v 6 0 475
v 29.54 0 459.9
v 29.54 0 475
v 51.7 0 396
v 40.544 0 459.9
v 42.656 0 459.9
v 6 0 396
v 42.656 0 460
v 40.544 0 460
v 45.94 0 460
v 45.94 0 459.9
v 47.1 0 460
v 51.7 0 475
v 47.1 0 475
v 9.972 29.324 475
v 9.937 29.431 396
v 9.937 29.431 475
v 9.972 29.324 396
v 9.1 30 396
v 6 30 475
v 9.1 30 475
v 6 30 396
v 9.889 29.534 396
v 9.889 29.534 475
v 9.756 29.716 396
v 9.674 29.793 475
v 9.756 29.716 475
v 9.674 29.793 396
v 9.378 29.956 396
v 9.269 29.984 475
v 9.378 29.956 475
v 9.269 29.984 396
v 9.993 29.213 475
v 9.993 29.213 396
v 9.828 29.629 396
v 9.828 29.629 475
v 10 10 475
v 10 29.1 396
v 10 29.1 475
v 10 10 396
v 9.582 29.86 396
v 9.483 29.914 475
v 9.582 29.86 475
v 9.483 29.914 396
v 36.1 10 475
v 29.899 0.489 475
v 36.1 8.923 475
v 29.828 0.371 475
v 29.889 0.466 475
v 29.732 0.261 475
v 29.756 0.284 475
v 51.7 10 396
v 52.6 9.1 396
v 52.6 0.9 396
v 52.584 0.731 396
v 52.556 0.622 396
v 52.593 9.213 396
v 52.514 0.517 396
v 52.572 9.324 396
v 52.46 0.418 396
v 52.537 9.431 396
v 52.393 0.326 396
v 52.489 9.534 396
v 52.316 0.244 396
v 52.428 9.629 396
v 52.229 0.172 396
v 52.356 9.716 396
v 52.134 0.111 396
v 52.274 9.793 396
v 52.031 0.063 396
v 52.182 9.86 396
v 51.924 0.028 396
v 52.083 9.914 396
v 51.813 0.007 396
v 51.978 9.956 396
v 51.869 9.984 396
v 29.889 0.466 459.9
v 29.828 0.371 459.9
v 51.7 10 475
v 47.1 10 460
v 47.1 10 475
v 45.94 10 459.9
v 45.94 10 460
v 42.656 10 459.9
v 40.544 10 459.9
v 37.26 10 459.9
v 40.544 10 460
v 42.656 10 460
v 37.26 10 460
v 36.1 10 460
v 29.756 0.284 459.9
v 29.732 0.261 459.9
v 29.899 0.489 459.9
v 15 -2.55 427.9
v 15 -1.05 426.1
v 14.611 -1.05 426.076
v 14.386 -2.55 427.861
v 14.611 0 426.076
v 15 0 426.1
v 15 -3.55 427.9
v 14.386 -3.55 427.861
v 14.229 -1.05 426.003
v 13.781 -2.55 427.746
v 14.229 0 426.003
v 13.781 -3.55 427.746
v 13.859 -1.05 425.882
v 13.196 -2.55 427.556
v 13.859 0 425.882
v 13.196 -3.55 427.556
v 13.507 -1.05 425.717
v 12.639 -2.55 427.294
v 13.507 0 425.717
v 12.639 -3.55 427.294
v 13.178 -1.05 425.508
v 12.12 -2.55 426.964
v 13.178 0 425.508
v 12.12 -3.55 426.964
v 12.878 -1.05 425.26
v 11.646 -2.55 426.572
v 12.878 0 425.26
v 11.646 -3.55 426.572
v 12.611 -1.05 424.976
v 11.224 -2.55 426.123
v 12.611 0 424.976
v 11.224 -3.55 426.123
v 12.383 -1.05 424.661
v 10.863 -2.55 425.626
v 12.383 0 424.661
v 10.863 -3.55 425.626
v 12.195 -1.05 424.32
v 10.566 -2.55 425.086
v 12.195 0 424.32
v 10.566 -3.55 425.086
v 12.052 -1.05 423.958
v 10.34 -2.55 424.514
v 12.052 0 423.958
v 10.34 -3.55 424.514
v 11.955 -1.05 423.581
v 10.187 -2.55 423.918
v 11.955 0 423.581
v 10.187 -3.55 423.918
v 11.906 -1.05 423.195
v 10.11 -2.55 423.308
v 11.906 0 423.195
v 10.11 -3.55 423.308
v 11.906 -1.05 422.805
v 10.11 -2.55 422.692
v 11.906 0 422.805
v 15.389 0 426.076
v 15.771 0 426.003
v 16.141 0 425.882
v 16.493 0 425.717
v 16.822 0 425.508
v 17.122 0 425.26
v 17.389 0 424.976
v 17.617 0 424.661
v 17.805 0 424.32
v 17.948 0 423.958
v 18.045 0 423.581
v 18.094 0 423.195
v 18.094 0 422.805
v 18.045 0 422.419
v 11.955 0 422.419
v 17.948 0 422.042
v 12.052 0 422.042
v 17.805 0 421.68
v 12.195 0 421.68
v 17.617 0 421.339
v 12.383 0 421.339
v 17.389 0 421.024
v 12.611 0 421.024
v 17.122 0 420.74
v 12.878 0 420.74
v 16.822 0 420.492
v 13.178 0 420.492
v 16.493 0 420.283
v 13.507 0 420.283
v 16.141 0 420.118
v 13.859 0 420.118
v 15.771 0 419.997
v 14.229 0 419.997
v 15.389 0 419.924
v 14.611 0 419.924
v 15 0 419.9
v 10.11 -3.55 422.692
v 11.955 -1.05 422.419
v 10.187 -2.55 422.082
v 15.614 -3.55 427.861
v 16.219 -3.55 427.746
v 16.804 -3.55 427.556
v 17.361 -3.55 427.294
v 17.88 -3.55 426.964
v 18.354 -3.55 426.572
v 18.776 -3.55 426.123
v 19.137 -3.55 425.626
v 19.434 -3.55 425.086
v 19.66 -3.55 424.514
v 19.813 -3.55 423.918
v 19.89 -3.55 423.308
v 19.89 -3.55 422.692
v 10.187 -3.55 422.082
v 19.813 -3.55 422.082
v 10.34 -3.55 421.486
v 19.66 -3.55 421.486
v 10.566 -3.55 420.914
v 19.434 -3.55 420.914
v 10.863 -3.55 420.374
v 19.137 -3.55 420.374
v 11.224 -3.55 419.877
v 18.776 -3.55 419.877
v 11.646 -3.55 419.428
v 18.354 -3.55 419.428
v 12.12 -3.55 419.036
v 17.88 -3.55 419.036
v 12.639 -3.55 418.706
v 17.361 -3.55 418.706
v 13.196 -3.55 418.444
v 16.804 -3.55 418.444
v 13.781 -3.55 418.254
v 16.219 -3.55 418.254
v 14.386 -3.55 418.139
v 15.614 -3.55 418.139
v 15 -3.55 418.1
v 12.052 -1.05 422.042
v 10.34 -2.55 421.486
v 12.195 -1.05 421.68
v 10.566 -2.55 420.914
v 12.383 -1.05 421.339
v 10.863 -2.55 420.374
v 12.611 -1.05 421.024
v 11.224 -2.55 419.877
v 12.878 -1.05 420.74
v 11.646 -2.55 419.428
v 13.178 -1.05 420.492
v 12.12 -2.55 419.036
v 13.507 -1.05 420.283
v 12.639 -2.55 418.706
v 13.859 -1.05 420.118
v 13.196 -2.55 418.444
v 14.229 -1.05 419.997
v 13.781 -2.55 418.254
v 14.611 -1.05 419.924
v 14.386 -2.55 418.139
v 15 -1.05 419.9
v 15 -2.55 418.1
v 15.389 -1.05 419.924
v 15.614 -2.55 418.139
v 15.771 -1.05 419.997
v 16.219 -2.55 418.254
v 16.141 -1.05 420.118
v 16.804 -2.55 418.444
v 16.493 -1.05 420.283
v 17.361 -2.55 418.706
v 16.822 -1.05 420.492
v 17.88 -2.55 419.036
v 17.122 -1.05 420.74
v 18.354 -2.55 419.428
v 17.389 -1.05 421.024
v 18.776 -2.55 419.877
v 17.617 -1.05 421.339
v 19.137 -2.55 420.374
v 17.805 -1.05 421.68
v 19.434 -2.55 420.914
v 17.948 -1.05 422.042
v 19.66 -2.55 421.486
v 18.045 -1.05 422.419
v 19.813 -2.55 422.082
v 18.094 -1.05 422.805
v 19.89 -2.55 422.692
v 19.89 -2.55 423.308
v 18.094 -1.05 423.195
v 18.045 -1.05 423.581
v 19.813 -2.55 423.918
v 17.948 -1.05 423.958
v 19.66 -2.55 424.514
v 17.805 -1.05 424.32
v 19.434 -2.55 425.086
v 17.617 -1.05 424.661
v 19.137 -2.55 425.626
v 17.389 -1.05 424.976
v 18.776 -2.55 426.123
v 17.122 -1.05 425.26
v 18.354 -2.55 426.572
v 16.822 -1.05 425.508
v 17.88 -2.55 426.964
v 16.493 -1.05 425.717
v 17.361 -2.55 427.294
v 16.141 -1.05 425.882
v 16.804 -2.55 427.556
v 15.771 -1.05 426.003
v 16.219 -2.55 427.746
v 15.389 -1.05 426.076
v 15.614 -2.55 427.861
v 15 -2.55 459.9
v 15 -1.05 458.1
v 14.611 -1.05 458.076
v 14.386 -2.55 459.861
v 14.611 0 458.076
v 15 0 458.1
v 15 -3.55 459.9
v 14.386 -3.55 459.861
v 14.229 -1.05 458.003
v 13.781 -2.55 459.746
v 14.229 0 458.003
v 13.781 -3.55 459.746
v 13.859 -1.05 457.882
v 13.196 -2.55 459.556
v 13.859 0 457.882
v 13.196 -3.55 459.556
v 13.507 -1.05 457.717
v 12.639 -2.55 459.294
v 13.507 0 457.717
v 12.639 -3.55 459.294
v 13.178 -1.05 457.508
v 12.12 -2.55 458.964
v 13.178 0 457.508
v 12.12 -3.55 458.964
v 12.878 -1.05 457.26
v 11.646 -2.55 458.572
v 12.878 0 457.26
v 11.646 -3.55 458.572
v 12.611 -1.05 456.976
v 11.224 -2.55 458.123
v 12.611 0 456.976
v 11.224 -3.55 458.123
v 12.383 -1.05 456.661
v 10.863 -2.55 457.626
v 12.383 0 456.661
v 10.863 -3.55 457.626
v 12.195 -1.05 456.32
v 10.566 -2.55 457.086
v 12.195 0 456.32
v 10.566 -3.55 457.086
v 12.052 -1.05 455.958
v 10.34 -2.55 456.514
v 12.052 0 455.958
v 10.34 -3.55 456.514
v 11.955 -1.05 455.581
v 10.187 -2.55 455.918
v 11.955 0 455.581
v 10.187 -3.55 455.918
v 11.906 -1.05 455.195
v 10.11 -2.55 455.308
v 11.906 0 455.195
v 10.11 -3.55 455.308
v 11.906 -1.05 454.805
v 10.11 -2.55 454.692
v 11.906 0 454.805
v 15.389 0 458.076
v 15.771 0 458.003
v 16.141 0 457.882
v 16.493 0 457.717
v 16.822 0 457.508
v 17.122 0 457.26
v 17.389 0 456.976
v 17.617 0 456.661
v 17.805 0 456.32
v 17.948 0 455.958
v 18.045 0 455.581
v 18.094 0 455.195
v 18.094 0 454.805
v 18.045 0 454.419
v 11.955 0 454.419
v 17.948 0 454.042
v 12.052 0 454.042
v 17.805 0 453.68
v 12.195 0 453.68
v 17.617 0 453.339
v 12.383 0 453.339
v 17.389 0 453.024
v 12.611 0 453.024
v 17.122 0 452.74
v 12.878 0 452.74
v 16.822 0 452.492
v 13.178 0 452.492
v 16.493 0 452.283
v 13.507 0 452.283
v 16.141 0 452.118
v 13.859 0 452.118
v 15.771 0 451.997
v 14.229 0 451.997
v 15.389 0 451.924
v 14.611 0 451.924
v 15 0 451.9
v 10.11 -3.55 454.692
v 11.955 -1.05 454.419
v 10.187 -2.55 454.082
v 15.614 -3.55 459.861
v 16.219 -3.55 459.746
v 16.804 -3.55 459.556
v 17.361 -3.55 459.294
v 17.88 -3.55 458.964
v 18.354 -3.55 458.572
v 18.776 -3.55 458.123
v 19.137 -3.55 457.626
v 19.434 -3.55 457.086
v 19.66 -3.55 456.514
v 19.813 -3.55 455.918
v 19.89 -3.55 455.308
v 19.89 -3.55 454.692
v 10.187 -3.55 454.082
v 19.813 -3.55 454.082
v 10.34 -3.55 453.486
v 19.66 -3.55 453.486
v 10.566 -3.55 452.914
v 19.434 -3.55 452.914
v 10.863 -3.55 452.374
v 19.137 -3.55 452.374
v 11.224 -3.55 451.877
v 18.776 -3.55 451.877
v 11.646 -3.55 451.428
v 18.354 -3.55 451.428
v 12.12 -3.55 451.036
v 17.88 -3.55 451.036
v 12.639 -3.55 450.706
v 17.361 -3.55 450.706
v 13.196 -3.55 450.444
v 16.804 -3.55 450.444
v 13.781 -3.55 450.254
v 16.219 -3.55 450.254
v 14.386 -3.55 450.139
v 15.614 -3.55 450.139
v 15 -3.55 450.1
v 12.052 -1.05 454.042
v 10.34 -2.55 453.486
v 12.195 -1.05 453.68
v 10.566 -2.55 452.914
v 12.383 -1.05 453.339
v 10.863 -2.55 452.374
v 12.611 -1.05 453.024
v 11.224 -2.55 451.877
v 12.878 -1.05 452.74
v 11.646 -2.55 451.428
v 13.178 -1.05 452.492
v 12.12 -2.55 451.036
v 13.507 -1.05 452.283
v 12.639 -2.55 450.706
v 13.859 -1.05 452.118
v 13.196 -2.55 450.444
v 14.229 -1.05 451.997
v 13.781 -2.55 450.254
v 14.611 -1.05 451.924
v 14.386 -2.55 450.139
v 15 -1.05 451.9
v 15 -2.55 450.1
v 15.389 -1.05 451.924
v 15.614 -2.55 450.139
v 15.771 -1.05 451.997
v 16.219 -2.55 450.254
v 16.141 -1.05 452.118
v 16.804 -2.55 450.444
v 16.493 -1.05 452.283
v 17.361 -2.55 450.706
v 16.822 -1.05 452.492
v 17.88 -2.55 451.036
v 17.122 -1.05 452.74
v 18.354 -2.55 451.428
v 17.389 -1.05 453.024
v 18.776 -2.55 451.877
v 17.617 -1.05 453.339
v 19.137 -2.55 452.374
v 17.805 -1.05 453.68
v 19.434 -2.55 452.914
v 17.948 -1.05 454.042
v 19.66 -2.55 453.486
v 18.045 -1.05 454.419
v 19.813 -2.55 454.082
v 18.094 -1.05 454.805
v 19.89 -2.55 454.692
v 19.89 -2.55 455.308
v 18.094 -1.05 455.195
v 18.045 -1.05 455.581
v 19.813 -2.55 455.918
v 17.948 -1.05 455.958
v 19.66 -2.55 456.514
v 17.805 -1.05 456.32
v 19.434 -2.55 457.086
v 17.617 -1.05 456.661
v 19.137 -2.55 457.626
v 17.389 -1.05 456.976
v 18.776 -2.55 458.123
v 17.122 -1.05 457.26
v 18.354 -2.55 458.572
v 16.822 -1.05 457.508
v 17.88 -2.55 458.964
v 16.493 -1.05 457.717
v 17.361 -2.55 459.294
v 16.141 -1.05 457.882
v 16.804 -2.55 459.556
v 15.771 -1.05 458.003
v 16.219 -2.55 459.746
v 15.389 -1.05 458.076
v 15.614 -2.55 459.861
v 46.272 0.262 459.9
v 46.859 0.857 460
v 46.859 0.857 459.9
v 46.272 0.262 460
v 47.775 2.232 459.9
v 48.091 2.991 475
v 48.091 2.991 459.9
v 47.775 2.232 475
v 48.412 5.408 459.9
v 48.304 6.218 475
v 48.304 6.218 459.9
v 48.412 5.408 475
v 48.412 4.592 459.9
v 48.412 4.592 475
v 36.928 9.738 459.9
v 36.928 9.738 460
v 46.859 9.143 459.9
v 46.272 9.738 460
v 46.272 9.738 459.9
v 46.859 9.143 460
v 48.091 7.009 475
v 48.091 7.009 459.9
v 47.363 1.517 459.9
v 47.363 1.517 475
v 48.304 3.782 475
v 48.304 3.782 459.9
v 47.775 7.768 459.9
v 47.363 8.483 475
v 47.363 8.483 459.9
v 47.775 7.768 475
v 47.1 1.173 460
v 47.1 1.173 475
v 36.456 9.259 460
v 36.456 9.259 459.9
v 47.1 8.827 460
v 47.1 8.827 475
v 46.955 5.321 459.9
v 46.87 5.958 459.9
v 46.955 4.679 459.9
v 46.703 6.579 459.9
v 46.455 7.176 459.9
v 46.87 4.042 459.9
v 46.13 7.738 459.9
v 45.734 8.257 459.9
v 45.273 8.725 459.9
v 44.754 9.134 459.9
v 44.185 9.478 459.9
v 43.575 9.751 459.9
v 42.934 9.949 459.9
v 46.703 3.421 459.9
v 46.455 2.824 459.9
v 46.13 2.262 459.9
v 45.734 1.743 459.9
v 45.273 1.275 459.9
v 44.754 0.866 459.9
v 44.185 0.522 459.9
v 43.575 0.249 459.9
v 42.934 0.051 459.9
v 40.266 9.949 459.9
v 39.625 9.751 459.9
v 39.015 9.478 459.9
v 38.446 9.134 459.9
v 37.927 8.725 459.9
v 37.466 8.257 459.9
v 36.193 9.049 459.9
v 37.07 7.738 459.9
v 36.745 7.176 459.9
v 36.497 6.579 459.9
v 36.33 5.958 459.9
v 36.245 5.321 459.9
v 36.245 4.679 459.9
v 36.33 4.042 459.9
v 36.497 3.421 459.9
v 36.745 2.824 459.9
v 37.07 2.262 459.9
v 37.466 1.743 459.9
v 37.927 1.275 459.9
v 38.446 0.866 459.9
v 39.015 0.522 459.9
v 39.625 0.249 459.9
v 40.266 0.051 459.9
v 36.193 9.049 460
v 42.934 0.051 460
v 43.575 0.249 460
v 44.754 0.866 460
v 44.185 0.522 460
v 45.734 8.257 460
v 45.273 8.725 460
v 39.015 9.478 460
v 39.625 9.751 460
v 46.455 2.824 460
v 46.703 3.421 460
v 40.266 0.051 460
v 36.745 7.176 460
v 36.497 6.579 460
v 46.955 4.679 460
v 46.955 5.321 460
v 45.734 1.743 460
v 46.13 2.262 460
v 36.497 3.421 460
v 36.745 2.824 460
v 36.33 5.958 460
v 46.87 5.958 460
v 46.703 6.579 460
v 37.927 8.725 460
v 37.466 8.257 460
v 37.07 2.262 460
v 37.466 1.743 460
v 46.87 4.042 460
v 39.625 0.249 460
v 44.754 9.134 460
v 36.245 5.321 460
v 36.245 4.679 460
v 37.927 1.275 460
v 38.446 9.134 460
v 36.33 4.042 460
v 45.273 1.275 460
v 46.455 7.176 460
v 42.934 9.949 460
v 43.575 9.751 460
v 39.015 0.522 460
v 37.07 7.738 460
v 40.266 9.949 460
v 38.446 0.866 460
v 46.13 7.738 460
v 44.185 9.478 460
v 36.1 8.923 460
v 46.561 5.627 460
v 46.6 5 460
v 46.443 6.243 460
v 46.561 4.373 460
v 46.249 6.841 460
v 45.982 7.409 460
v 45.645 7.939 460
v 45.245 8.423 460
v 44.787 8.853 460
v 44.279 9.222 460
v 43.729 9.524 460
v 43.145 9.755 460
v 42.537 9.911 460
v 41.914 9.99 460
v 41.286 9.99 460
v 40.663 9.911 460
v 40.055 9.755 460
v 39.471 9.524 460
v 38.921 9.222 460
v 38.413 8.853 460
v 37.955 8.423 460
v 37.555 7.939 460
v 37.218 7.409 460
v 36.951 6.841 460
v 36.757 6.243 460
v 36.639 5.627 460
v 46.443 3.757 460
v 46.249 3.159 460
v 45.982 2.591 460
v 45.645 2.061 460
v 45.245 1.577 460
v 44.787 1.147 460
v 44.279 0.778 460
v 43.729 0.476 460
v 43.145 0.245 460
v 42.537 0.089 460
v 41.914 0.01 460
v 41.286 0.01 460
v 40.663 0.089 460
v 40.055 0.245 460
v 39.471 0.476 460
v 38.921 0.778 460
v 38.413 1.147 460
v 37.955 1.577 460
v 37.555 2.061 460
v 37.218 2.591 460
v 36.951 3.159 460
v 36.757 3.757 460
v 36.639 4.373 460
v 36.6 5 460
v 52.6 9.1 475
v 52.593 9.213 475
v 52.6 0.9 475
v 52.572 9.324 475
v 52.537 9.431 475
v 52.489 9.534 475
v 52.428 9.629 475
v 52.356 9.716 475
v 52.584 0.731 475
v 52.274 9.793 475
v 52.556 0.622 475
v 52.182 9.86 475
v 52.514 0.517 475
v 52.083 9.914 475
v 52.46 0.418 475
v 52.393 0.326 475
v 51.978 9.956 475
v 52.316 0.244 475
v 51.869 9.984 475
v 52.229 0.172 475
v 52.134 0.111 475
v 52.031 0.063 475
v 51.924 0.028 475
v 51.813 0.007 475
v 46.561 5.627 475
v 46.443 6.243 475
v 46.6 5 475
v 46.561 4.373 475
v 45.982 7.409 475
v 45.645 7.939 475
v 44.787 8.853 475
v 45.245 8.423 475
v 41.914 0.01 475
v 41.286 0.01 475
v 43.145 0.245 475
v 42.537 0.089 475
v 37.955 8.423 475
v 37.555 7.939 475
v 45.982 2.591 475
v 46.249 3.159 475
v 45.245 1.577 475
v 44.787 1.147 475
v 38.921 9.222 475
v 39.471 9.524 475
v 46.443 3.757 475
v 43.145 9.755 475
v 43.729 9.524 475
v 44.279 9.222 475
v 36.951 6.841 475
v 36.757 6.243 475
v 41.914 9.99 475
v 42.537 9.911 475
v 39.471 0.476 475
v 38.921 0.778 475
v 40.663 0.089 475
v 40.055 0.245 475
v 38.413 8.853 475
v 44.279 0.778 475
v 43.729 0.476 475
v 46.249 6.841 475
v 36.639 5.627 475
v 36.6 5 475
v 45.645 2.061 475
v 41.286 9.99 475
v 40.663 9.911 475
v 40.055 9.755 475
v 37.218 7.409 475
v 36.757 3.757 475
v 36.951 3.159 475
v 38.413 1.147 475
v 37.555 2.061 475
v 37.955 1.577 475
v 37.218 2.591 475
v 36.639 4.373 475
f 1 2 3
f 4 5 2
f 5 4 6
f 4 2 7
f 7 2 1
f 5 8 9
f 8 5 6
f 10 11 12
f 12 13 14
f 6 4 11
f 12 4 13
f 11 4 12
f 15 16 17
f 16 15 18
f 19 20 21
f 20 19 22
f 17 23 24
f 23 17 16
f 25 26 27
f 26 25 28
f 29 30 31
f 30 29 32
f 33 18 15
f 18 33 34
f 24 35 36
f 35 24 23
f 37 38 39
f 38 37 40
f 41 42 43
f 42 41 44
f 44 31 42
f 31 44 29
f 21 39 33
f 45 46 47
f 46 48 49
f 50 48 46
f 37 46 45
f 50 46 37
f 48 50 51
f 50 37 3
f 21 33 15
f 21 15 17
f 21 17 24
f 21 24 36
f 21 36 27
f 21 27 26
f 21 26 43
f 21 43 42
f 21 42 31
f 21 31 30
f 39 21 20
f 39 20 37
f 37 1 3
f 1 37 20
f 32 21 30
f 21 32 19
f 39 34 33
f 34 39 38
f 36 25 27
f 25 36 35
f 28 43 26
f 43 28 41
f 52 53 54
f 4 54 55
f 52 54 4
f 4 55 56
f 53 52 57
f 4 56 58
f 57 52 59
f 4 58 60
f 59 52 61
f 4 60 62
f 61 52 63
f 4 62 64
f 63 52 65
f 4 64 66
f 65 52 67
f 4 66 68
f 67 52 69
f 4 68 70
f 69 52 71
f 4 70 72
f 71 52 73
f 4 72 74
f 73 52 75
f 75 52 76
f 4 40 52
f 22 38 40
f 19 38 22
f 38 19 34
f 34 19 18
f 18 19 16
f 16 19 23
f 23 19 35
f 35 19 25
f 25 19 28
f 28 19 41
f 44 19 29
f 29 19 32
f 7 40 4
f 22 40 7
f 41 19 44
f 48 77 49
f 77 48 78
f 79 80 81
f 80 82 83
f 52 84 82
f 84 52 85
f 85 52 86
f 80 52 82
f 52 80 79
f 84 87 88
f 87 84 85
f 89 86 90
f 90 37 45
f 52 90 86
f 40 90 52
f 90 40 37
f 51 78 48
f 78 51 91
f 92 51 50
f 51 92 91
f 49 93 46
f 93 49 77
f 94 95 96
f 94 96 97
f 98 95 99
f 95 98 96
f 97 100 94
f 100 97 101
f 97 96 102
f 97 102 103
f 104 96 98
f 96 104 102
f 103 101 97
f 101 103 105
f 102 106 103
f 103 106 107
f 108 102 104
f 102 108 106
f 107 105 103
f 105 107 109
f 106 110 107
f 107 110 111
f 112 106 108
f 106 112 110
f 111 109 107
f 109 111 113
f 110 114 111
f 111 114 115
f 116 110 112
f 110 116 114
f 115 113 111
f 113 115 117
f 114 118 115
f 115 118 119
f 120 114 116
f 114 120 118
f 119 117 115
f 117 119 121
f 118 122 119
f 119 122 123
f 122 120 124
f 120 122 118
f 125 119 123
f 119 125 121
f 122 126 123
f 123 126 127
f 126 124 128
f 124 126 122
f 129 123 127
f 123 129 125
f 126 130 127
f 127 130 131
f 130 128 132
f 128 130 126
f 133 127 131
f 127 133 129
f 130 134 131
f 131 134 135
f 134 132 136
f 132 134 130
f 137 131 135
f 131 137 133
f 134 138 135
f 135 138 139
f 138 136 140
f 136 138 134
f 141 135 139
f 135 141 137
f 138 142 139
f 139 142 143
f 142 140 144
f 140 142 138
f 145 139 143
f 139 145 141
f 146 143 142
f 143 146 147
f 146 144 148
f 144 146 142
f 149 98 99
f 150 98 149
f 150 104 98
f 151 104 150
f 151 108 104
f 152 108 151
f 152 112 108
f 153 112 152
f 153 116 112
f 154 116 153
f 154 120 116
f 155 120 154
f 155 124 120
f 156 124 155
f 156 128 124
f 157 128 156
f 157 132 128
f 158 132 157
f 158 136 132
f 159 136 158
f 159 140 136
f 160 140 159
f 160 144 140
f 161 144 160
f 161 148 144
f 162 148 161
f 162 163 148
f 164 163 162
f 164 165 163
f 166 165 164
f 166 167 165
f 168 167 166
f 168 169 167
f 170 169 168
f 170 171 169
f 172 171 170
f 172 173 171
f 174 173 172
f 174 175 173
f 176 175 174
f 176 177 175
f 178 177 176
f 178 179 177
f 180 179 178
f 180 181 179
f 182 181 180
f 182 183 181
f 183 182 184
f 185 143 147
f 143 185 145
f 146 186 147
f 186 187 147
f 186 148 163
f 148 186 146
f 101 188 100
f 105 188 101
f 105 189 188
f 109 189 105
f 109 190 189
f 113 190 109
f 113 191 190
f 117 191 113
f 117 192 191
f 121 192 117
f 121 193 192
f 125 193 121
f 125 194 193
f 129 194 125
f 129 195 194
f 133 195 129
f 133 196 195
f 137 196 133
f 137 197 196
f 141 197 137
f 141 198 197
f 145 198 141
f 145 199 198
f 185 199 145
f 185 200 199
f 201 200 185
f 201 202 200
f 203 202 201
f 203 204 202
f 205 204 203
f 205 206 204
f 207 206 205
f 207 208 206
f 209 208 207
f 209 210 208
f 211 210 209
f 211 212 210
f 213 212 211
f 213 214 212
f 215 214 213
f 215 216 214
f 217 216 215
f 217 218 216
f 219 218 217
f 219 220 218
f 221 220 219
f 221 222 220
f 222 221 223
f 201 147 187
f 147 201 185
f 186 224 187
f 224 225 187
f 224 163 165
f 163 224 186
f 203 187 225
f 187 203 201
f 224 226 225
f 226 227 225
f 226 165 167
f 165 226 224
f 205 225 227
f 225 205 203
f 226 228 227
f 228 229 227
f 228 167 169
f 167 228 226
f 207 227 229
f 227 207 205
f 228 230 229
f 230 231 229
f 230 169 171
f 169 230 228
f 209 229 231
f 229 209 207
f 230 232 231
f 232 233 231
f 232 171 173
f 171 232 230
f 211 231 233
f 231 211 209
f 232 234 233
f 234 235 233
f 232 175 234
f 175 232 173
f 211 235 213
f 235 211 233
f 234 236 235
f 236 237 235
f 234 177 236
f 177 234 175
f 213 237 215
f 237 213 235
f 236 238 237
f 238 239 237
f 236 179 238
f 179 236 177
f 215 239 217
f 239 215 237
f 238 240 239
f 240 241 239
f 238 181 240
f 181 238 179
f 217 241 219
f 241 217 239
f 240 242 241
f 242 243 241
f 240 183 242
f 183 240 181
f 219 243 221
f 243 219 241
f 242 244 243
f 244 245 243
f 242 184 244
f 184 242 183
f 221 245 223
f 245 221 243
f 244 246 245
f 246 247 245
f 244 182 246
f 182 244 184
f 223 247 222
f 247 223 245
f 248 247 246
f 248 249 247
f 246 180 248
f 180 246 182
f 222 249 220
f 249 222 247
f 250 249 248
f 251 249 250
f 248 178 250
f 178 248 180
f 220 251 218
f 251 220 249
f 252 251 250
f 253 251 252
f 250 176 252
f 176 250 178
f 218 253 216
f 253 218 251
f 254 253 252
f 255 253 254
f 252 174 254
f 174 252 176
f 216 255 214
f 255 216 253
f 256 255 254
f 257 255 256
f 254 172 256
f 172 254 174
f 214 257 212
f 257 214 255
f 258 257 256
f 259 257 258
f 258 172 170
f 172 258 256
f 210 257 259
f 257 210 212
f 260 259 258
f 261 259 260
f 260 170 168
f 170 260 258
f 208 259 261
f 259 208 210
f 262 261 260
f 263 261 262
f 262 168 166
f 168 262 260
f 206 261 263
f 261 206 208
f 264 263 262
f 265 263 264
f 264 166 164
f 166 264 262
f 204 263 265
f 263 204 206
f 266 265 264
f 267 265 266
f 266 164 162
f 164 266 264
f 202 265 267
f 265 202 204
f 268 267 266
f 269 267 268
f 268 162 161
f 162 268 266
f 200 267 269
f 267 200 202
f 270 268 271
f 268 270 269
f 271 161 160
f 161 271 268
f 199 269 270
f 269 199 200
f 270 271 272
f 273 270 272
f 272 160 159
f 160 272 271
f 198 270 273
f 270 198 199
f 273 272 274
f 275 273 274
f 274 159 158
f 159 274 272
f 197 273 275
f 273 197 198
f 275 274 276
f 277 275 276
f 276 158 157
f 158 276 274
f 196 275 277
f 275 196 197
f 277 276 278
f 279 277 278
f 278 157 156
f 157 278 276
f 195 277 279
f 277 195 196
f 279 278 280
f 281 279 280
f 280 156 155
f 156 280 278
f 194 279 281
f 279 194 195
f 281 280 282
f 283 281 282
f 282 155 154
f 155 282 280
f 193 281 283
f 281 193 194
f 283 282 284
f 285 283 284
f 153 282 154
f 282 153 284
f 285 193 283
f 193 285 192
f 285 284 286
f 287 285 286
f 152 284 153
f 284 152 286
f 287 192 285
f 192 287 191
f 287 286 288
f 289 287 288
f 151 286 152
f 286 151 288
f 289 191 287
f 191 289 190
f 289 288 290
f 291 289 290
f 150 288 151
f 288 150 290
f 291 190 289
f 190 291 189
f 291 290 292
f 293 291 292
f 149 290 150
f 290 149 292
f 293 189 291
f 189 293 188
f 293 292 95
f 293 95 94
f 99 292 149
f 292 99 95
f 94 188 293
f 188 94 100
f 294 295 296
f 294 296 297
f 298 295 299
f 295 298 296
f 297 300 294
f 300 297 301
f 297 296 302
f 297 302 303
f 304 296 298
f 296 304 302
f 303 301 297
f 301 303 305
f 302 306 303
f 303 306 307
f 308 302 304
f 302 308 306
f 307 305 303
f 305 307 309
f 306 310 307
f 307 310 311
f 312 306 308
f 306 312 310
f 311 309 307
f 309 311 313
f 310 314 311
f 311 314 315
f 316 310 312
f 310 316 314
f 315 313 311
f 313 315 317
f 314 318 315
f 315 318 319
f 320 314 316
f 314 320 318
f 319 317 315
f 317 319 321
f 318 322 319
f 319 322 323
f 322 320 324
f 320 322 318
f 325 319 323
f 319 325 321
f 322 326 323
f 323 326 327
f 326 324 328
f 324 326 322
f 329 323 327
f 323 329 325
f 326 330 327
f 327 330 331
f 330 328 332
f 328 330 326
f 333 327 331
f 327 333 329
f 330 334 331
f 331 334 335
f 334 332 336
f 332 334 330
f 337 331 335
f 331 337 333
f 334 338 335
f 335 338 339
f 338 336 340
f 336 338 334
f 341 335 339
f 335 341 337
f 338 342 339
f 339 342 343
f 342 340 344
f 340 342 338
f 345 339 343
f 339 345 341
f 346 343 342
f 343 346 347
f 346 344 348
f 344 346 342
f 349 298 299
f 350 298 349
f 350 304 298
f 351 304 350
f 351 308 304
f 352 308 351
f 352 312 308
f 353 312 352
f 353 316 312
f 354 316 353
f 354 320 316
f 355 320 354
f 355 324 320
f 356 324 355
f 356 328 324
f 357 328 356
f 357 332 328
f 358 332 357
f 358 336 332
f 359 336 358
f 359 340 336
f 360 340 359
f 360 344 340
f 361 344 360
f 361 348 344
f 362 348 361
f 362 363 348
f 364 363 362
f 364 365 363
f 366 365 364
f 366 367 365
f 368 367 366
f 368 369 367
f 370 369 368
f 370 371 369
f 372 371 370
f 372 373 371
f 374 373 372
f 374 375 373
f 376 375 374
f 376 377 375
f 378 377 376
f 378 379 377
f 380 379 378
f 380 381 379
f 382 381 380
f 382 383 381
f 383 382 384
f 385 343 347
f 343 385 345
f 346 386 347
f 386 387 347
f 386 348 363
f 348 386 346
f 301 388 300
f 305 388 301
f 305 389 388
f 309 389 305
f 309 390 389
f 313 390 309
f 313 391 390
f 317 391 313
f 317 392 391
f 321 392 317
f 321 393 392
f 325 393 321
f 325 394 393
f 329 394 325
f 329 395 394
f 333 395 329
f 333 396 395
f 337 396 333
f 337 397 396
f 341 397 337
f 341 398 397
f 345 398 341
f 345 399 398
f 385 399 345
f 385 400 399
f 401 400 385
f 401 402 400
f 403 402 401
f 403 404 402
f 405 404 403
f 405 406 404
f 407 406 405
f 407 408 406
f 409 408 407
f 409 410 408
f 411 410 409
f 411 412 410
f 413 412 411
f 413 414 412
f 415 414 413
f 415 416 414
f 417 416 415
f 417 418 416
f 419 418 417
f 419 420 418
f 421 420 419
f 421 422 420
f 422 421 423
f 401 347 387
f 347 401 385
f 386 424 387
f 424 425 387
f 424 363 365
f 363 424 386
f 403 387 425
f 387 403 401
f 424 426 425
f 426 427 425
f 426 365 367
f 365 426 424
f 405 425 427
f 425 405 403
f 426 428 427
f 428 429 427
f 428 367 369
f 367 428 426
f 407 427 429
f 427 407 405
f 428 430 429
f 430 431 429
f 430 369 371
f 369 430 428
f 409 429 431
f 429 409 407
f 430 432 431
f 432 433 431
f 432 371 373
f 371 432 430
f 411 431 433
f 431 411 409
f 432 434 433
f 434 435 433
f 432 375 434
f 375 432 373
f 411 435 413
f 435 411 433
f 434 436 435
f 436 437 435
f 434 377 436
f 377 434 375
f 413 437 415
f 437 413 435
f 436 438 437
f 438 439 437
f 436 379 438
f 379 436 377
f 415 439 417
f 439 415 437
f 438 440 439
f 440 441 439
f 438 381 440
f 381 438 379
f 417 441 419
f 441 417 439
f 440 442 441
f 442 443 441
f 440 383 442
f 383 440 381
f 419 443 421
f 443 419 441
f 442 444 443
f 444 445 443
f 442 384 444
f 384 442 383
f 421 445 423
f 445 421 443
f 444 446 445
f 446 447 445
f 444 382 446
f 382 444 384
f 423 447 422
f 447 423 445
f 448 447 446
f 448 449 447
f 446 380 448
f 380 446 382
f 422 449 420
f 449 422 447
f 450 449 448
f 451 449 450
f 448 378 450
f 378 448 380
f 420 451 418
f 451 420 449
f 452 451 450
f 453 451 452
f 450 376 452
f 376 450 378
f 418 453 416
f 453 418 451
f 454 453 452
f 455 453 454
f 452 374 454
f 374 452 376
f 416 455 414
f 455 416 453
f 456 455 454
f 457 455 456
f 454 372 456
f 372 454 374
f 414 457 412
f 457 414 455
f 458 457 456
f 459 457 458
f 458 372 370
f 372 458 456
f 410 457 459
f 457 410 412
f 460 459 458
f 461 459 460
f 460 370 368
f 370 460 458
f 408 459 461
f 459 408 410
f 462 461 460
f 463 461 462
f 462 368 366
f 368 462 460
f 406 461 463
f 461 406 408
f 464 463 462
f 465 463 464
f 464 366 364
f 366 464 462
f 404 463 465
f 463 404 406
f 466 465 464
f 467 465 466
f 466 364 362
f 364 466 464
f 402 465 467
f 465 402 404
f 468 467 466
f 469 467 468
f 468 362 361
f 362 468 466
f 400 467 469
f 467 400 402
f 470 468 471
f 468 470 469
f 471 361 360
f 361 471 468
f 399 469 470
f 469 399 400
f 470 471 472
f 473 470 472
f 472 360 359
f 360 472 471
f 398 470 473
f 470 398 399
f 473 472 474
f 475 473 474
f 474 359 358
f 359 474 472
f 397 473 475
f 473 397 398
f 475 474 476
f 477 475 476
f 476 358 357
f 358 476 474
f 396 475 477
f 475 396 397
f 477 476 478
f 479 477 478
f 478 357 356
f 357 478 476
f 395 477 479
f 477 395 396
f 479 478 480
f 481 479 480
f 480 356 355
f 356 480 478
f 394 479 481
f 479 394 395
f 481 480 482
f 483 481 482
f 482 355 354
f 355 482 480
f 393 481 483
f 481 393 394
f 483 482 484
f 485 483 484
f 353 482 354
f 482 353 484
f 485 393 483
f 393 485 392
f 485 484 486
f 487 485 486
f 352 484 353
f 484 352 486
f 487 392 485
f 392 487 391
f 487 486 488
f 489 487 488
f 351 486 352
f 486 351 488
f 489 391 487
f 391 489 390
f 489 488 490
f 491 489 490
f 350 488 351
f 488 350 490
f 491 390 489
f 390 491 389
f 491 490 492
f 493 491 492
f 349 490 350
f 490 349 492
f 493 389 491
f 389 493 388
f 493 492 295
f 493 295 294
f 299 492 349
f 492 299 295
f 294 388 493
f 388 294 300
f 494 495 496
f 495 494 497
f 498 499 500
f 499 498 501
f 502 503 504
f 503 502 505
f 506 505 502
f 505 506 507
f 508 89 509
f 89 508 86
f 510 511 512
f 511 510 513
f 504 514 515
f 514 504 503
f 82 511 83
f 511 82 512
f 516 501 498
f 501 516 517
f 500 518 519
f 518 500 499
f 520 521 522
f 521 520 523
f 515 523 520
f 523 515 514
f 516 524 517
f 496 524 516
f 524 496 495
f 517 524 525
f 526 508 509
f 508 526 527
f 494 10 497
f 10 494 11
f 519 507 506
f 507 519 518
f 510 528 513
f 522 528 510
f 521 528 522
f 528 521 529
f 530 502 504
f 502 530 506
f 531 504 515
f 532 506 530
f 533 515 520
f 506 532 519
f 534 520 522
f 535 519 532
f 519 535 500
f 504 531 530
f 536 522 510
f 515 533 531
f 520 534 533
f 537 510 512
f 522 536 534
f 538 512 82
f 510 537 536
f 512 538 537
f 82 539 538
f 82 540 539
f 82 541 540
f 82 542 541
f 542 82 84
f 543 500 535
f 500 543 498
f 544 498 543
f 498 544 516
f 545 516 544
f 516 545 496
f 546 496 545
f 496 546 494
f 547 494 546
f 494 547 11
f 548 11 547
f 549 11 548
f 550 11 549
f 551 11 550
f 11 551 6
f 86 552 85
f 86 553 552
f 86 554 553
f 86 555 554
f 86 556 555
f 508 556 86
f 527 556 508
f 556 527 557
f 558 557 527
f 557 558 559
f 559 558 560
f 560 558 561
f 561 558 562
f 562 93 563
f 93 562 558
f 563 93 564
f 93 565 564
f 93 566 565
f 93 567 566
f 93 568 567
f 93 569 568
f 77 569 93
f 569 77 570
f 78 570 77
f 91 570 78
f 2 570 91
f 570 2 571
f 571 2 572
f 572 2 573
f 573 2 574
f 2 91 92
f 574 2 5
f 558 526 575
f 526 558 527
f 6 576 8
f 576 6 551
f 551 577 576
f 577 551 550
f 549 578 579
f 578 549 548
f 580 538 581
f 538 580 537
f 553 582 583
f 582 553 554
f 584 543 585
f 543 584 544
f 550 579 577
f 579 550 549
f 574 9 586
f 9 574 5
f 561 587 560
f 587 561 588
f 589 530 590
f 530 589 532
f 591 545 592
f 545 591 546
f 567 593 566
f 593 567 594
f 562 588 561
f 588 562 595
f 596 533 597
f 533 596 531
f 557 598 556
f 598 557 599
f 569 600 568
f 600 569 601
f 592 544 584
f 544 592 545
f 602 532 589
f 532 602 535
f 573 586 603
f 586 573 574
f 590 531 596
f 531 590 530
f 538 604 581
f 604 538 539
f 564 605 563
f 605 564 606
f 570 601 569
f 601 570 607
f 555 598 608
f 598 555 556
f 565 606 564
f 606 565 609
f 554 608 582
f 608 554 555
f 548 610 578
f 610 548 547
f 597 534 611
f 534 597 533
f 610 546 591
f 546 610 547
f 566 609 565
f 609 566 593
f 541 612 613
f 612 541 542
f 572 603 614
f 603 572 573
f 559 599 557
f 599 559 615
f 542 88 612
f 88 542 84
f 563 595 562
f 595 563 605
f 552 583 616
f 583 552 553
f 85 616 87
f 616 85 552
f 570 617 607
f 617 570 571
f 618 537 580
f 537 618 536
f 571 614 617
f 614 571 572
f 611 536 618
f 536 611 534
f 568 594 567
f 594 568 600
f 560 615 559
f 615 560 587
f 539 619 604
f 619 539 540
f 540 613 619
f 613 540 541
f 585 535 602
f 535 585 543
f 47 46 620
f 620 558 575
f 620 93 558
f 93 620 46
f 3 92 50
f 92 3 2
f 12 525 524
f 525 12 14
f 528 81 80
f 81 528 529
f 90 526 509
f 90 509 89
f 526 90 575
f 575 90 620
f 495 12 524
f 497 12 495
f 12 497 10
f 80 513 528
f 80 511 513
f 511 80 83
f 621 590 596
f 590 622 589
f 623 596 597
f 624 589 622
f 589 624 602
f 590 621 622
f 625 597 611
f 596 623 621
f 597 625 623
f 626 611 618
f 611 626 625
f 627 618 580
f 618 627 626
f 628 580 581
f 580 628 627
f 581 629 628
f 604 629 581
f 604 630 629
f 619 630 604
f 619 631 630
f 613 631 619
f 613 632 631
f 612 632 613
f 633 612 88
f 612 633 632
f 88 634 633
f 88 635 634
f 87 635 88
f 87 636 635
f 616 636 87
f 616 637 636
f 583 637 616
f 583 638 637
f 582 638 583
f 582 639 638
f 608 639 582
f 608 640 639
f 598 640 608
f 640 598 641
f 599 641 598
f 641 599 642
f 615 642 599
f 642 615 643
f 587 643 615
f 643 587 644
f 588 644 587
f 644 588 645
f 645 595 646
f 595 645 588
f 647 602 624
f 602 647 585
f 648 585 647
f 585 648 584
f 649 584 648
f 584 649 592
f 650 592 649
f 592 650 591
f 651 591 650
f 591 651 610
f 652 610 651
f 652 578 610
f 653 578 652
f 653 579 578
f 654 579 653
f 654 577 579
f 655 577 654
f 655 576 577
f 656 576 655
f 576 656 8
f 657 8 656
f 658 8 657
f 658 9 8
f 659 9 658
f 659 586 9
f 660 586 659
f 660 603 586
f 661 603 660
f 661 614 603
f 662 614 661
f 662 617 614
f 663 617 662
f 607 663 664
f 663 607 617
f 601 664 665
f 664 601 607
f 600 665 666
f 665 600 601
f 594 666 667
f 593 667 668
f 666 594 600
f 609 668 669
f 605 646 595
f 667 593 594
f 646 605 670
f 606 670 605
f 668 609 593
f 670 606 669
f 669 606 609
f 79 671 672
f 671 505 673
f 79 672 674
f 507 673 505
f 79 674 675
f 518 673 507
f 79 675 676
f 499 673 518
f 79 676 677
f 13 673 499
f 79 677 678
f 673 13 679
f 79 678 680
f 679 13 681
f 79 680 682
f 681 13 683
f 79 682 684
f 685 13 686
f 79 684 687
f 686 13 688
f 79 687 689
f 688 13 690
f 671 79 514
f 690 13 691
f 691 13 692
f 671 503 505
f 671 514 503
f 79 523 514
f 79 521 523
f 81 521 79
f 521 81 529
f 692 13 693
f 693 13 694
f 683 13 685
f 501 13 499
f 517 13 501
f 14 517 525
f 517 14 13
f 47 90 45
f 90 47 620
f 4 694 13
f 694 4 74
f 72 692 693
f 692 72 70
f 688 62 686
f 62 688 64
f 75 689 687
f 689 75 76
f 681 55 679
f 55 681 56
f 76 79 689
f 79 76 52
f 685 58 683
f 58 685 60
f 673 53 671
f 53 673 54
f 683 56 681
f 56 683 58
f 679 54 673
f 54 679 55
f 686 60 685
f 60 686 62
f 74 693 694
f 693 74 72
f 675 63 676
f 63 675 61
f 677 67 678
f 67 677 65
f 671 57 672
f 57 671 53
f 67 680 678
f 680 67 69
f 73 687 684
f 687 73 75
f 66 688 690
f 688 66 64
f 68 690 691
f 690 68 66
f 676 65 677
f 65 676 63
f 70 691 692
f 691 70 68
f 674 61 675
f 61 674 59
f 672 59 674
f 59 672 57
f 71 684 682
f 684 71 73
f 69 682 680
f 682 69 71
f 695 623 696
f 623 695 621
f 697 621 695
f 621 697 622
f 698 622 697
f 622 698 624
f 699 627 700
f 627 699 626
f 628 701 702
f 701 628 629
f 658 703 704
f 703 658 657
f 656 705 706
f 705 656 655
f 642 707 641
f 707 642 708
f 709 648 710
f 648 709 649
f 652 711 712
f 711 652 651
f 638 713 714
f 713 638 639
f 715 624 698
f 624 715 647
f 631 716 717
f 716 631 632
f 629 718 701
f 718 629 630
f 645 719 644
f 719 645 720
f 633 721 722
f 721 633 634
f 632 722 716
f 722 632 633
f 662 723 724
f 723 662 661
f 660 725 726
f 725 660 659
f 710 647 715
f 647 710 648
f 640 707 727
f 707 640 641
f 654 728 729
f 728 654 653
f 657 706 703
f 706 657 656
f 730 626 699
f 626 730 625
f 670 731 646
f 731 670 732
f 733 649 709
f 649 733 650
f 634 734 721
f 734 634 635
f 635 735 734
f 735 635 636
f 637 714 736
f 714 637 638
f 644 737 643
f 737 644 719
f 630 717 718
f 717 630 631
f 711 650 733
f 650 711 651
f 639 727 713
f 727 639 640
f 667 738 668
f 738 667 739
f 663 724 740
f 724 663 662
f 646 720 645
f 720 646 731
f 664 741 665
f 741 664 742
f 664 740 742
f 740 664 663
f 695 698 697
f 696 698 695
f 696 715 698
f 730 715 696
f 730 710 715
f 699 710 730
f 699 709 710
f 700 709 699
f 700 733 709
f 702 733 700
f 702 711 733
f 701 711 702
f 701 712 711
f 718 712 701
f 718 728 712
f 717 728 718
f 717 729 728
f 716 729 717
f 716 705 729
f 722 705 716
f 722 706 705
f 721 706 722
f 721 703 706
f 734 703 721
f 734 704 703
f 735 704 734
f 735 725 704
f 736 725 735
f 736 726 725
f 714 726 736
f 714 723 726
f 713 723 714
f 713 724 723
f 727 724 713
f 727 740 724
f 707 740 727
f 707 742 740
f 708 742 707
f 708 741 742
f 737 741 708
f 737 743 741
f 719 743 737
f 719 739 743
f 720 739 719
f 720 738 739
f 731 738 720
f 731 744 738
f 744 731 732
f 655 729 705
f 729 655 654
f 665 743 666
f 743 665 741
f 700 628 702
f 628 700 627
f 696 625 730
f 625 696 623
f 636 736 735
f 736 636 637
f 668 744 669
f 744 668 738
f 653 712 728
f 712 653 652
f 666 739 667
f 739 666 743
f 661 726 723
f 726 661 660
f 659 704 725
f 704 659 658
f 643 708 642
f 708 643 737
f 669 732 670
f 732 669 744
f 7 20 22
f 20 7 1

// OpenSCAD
$fn=50;

plastic_thickness=2.0;
tolerance=0.22;

// Specify enclosure dimensions
enclosure_height=475.0;

enclosure_depth=535.0;

// Wall panel dimensions
panel_thickness=6.0;
panel_height=450.0;
panel_width=535.0;
panel_offset_z = enclosure_height - panel_height;

// Door panel dimensions
door_panel_thickness=3.0;
door_panel_width=250.0;
door_panel_height=475.0;
door_hinge_offset=6.5;

// Frame
frame_corner_width=30.0;
frame_corner_height=79.0;
frame_thickness = plastic_thickness*2 + panel_thickness;
frame_side = (enclosure_height - frame_corner_height*2)/2;
frame_clip_height=50.5;
corner_roundness=0.9;

// Interlock
knob_diameter=9.8;
lug_diameter=6.2;
lug_gap=1.4;
lug_height = lug_gap+2.15;
interlock_offset_x=15.0;
interlock_offset_z=27.0;
interlock_gap=32;

// Door hinge
hinge_inner_diameter=10;
hinge_height=25;
hinge_length=53;
hinge_gap = 9.6;
hinge_clearance = 1.5;
hinge_ring_thickness=3.0;
hinge_thickness=plastic_thickness*2 + door_panel_thickness;
hinge_offset=6.5+plastic_thickness;


enclosure_width=2*(frame_corner_width+plastic_thickness+hinge_gap+door_hinge_offset) + door_panel_width*2 +tolerance;

// applies roundness without altering dimensions of object
module apply_roundness(r)
    offset(r) offset(delta=-r) children(0);

// makes a corner piece by mirroring and rotating one side
module cornerize() {
    union() {
        children(0);
        mirror([0,1,0]) 
            rotate([0,0,-90])
                children(0);
    }
} 

// translates an imperceptible difference to avoid coincident faces
// in CSG operations. this is used to remove glitches in preview
module fix_preview() {
    translate($preview?[-0.001,-0.001,-0.001]:[0,0,0])
        children(0);
}

module fix_preview2() {
    translate($preview?[-0.001,0.001,-0.001]:[0,0,0])
        children(0);
}

module fix_preview3() {
    translate($preview?[-0.001,0.001,0.001]:[0,0,0])
        children(0);
}


module wall_panel() {
    cube([panel_height,panel_width,panel_thickness]);
}

module door_panel() {
     cube([door_panel_width,door_panel_height,door_panel_thickness]);
}

module left_wall_panel() {
    translate([panel_thickness,0,panel_offset_z]) 
        rotate([0,-90,0]) 
            wall_panel();
}

module back_wall_panel() {
    translate([(enclosure_width-panel_width)/2,enclosure_depth-panel_thickness-plastic_thickness,panel_offset_z]) 
        rotate([-90,-90,0]) 
            wall_panel();
}

module right_wall_panel() {
    translate([enclosure_width,0,panel_offset_z]) 
        rotate([0,-90,0]) 
            wall_panel();
}

module left_door(open=false) {
    translate([frame_corner_width+plastic_thickness+hinge_gap,hinge_inner_diameter/2,0]) 
        rotate([90,0,open?-90:0]) 
            translate([door_hinge_offset,0,hinge_offset-door_panel_thickness/2])
                door_panel();
}

module right_door(open=false) {
    translate([enclosure_width,0,0])  
        mirror([1,0,0]) left_door(open);
}

module interlock() {
    ra = knob_diameter/2;
    rb = lug_diameter/2;
    
    color("DarkSeaGreen")
        rotate([0,90,90]) 
            rotate_extrude()
                polygon([[0,0],[0,lug_height],[rb,lug_height],[rb,2.5],[ra,1],[ra,0]]);
}

module frame_corner( width, height, thickness, roundCorners ) {         
    color("SteelBlue") 
        cornerize()
            linear_extrude(height=height)
                apply_roundness(roundCorners, $fs =0.01) 
                square( [thickness, width] );
}

module add_lugs() {   
    union() {
        children(0);

        translate([interlock_offset_x,-lug_height,interlock_offset_z]) 
            interlock();

        translate([interlock_offset_x,-lug_height,interlock_offset_z+interlock_gap])
            interlock(); 
    } 
}

module back_left_bottom_corner() {
    difference() {
        translate([0,enclosure_depth,0])
            mirror([0,1,0])
                add_lugs()
                    frame_corner( frame_corner_width, frame_corner_height,frame_thickness, corner_roundness);
        fix_preview2() left_wall_panel();
        fix_preview2() back_wall_panel();
    }
}

module back_left_top_corner() {              
    difference() {
        translate([0,enclosure_depth,enclosure_height-frame_corner_height])
            mirror([0,1,0]) 
                add_lugs() frame_corner( frame_corner_width, frame_corner_height,frame_thickness, corner_roundness);   
        fix_preview3() left_wall_panel();
        fix_preview3() back_wall_panel();
    }
}

module hinge_post() {
     union() {
        difference() {
            
            // add material to support the hinge and fill the gap betwen the perspex
            // doors and the patsic frame
            color("SteelBlue")
            translate([-hinge_inner_diameter*2,-hinge_inner_diameter/2,0]) 
                linear_extrude(height=frame_corner_height)
                    apply_roundness(corner_roundness, $fs =0.01) 
                        square([hinge_inner_diameter*3+1,hinge_inner_diameter]);
            
            // create a negative space that snuggly fits the hinge
            union() {
                height = hinge_height-hinge_inner_diameter;
                translate([0,0,height/2]) cube([hinge_inner_diameter+1,hinge_inner_diameter+1,height],true);
                
                rotate([0,0,-90]) translate([0,0,-1.4]) scale([1,1.05,1.1]) hinge();
            }
        }
        color("SteelBlue")
        cylinder(d=hinge_inner_diameter, frame_corner_height);
    }
}

module hinge() {
    height = hinge_height-hinge_inner_diameter;
    width = hinge_inner_diameter+hinge_ring_thickness;
    difference() {
        
        // create the base shape for the hinge
        color("Salmon") union() {
            cylinder(d=width, height);
            
            translate([hinge_inner_diameter*3+hinge_clearance,
                -hinge_offset,height/2-plastic_thickness/2]) 
                cube([hinge_length,hinge_thickness,height+plastic_thickness],true);
           
            translate([2.52,-5.2,height/2]) 
                rotate([0,0,40]) 
                    cube([hinge_inner_diameter,width+1,height],true);
        }
        
        // remove a hole for the hinge post to slide into
        cylinder(d=hinge_inner_diameter+tolerance, height+1);
        
        // trim the left corner
        translate([4,-17.5,height/2-1]) rotate([0,0,145]) cube([50,width-2,height+3],true);
        
        // smooth the tranistion to the bottom edge
        translate([19,-10,height/2-17.85]) rotate([-88.5,0.1,96]) cube([40,20,100],true);
        
        // add a chamfer to right corner
        translate([hinge_length+8,0,height+25]) rotate([0,45,0]) cube(50,true);
    }   
}

module bottom_left_hinge(open=false) {
    difference() {
        translate([frame_corner_width+plastic_thickness+hinge_gap,(hinge_inner_diameter)/2,0]) 
            rotate([0,0,open?-90:0]) hinge();
        fix_preview() left_door(open);
    }
}

module top_left_hinge(open=false) {
    difference() {
        translate([0,0,enclosure_height])
            translate([frame_corner_width+plastic_thickness+hinge_gap,(hinge_inner_diameter)/2,0])
                mirror([0,0,1]) 
                rotate([0,0,open?-90:0]) hinge();
        fix_preview() left_door(open);
    }
}

module add_hinge_post( top=false ) {
    hinge_position=[frame_corner_width+plastic_thickness+hinge_gap, hinge_inner_diameter/2, (top?frame_corner_height:0)];
    cutout_height=hinge_height - hinge_inner_diameter + tolerance;
    union() {
        children(0);
        fix_preview() translate(hinge_position) mirror(top?[0,0,1]:[0,0,0])
            rotate([0,0,0]) hinge_post();
    }
}

module front_left_top_corner() {
    difference() {
        translate([0,0,enclosure_height-frame_corner_height]) 
            add_hinge_post(top=true) 
                add_lugs() frame_corner( frame_corner_width, frame_corner_height,frame_thickness, 0.9);
        fix_preview() left_wall_panel();
    }
}

module front_left_bottom_corner() {
        add_hinge_post(top=false)
            add_lugs()
                difference() {
                    frame_corner( frame_corner_width, frame_corner_height,frame_thickness, 0.9);
                    fix_preview() left_wall_panel();
                }
}


/*%left_wall_panel();
%back_wall_panel();
%right_wall_panel();


%left_door(open);
%right_door(open);

back_left_bottom_corner();
back_left_top_corner();*/
front_left_top_corner();
//front_left_bottom_corner();

//top_left_hinge(open);
//bottom_left_hinge(open);
open=false;
